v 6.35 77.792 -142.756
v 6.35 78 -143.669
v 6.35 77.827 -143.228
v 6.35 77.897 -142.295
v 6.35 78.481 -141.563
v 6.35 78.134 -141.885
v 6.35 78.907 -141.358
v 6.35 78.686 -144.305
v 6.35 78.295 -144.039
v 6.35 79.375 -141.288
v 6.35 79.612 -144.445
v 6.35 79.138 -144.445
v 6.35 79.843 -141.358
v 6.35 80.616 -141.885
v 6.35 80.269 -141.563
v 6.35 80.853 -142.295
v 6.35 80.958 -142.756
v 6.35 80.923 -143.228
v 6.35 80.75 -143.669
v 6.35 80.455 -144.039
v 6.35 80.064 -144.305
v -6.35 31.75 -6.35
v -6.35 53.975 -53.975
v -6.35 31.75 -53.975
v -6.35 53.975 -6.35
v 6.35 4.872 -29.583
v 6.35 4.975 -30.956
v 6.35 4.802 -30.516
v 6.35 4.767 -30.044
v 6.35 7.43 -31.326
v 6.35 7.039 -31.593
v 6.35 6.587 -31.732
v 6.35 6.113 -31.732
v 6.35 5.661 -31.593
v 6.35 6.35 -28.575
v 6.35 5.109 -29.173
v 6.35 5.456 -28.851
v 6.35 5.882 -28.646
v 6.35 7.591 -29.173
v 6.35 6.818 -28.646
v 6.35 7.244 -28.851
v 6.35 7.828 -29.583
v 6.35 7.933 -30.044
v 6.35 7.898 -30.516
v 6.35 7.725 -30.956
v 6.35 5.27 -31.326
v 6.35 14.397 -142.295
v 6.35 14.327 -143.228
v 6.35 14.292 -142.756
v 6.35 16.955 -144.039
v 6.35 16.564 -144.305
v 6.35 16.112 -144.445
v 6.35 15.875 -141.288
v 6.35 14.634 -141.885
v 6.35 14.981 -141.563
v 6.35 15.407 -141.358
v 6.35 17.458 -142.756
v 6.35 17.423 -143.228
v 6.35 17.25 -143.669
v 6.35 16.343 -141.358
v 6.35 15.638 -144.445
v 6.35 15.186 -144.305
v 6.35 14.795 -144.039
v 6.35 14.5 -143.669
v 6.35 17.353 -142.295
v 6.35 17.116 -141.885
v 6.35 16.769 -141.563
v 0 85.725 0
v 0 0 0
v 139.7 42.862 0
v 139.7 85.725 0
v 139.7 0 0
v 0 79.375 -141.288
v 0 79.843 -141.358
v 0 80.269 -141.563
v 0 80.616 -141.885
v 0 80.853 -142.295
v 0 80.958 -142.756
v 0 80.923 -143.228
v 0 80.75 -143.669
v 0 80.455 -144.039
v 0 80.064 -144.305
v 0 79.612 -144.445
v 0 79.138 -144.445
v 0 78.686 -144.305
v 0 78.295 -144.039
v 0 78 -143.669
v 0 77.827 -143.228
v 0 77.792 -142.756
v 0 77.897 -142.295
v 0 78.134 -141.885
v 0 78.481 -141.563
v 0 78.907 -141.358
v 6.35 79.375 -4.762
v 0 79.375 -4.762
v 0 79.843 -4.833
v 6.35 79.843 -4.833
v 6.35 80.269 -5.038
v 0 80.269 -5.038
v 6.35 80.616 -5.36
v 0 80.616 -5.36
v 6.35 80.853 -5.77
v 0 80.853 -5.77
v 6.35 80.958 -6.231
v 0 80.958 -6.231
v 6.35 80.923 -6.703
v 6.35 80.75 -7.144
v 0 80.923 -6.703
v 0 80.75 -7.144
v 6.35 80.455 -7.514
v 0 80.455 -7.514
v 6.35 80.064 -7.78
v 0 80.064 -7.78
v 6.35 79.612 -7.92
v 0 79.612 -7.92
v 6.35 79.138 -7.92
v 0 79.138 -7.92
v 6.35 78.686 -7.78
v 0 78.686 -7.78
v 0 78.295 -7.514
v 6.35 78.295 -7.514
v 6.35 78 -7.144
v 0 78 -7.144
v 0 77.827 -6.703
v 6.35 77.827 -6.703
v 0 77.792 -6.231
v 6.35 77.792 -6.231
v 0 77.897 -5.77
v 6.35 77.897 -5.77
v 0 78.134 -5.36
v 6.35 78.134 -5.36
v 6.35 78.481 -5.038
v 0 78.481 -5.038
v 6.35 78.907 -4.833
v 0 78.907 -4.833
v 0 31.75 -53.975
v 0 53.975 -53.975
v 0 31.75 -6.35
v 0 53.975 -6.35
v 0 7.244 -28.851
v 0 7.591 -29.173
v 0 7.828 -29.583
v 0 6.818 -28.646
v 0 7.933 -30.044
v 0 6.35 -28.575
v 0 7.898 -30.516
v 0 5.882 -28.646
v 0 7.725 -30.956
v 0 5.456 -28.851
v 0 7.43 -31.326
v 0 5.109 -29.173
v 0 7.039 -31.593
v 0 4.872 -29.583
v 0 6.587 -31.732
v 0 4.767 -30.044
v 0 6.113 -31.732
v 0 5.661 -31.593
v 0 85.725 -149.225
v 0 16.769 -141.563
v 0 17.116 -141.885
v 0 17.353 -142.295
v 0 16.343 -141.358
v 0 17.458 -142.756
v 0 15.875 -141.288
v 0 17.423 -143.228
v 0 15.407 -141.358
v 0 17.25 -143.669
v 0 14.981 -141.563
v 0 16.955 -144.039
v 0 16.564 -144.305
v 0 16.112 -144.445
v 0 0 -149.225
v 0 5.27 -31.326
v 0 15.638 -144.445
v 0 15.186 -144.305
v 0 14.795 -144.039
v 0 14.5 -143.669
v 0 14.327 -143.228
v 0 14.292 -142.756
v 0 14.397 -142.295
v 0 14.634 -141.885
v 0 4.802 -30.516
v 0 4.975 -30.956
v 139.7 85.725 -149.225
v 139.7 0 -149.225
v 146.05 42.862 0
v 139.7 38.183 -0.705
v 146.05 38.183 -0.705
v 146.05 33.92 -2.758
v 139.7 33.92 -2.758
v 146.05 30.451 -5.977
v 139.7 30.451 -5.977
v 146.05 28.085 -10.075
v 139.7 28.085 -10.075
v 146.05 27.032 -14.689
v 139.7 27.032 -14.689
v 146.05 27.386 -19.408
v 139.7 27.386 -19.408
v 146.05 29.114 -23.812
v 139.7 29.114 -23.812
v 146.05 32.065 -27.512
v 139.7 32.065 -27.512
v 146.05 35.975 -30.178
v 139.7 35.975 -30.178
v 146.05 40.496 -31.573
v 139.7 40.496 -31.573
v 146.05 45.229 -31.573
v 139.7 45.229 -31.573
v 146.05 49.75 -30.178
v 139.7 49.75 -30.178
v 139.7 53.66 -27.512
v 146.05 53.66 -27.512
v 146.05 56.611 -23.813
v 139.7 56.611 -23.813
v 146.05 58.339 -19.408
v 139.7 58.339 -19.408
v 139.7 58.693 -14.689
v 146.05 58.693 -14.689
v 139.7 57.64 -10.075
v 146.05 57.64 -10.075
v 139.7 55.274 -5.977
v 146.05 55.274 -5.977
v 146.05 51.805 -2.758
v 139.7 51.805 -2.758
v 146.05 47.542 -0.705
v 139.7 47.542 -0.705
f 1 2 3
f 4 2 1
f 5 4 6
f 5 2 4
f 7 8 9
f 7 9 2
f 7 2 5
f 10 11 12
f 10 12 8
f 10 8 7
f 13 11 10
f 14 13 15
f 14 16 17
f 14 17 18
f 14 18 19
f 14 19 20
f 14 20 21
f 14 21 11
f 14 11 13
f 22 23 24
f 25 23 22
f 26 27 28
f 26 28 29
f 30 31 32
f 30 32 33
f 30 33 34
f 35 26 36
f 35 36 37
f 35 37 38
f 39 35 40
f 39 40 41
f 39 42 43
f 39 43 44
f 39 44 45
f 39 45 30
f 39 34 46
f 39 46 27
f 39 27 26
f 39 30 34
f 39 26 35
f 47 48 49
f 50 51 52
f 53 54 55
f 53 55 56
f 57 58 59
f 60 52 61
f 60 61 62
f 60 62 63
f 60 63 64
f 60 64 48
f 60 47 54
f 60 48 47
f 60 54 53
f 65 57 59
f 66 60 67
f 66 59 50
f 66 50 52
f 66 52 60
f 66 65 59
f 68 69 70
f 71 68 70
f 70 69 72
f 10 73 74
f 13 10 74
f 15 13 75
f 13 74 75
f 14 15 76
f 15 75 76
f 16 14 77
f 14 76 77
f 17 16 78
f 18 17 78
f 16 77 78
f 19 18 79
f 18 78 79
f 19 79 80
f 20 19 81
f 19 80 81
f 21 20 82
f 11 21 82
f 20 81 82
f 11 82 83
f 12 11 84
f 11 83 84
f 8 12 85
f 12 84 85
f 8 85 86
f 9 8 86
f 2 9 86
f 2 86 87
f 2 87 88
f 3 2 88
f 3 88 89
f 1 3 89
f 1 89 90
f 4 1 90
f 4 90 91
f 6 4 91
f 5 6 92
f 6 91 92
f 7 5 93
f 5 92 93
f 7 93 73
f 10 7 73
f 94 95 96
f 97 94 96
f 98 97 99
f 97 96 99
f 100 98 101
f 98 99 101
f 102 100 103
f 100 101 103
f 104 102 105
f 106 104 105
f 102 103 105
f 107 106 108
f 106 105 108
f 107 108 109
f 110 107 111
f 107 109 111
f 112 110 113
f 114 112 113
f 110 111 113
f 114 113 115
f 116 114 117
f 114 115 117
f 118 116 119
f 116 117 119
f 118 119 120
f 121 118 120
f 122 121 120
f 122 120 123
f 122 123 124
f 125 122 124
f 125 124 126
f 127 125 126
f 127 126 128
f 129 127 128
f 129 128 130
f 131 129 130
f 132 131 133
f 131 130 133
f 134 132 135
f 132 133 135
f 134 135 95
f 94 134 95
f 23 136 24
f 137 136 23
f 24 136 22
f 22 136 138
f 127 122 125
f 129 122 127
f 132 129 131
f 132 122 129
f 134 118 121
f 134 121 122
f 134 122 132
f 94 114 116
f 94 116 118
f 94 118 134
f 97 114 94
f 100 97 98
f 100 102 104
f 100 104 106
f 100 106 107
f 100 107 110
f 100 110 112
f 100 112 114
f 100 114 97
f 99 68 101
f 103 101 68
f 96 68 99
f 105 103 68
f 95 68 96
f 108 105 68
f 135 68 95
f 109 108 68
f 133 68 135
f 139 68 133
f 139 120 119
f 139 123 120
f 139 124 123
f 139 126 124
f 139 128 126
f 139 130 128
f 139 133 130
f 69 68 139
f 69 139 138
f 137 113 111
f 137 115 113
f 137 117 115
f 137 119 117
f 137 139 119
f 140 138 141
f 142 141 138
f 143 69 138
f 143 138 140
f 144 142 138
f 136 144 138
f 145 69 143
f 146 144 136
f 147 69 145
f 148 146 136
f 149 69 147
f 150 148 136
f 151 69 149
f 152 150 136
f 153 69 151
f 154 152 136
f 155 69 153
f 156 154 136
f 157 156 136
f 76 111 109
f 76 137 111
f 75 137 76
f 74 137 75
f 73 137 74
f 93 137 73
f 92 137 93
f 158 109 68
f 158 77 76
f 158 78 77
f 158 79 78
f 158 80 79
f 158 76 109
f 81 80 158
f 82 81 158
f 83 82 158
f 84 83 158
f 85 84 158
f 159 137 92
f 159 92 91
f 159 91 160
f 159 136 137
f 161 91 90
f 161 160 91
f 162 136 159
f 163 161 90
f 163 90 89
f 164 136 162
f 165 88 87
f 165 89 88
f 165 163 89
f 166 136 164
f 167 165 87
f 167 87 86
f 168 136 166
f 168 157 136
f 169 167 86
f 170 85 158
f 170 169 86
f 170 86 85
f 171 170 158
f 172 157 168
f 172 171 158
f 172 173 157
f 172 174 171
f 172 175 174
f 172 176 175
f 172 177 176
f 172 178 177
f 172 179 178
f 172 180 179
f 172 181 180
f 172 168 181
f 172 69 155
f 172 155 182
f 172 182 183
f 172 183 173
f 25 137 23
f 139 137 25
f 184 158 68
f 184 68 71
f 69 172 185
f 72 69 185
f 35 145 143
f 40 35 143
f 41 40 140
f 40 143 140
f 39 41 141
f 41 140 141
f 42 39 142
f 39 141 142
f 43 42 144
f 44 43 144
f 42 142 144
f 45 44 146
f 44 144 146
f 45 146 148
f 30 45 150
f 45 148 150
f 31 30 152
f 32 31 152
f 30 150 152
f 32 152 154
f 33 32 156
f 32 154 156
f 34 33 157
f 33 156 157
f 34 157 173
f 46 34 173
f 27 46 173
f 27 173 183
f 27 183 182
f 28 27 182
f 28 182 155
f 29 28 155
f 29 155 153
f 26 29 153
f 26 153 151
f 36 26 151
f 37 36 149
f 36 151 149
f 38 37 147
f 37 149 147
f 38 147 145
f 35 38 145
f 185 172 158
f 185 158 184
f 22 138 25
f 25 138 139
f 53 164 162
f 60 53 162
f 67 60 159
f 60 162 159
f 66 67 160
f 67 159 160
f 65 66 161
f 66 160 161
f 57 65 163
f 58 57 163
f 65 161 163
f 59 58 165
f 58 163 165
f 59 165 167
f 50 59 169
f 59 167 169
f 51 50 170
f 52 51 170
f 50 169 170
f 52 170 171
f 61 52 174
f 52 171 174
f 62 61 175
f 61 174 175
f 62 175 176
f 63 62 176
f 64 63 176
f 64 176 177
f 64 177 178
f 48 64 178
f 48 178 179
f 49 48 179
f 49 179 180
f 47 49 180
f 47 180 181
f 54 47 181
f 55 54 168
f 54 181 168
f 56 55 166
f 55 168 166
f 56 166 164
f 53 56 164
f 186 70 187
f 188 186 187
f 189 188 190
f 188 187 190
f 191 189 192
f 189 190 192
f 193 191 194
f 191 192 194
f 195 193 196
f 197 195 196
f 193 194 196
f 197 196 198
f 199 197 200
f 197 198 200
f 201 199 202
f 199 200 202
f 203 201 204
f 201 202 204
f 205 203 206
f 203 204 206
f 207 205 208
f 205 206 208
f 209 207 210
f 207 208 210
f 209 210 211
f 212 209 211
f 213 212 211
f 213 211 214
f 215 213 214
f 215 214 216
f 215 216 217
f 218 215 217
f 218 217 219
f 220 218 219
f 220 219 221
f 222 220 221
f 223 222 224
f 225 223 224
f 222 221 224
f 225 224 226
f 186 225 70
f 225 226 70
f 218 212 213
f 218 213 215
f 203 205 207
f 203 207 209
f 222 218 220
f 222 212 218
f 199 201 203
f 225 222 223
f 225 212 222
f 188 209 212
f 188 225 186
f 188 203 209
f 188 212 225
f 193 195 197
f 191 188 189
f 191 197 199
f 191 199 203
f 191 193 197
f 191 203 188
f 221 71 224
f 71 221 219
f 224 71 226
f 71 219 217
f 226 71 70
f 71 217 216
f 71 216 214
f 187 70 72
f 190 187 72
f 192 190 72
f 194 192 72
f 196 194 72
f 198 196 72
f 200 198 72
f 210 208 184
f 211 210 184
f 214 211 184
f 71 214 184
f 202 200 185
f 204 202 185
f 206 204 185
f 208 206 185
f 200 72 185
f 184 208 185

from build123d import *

# Parameters (mm, degrees)
SKETCH1_W           = 139.7
SKETCH1_H           = 149.225
BOSS_EXTRUDE1_DEPTH = 85.725
SKETCH2_W           = 47.625
SKETCH2_H           = 22.225
BOSS_EXTRUDE2_DEPTH = 6.35
SKETCH3_R           = 15.875
BOSS_EXTRUDE3_DEPTH = 6.35
SKETCH4_R           = 1.5875
CUT_EXTRUDE1_DEPTH  = 6.35


with BuildPart() as part:
    # Sketch1 → Boss-Extrude1 (new body)
    with BuildSketch(Plane(origin=(0, 0, 0), x_dir=(1, 0, 0), z_dir=(0, 1, 0))):
        with Locations((69.85, 74.6125)):
            Rectangle(SKETCH1_W, SKETCH1_H)
    extrude(amount=BOSS_EXTRUDE1_DEPTH)

    # Sketch2 → Boss-Extrude2 (add)
    with BuildSketch(Plane.ZY):
        with Locations((-30.1625, 42.8625)):
            Rectangle(SKETCH2_W, SKETCH2_H)
    extrude(amount=BOSS_EXTRUDE2_DEPTH)

    # Sketch3 → Boss-Extrude3 (add)
    with BuildSketch(Plane(origin=(139.7, 0, 0), x_dir=(0, 0, -1), z_dir=(1, 0, 0))):
        with Locations(Location((15.875, 42.8625, 0), (0, 0, 180))):
            Circle(SKETCH3_R)
    extrude(amount=BOSS_EXTRUDE3_DEPTH)

    # Sketch4 → Cut-Extrude1 (cut)
    with BuildSketch(Plane.ZY):
        with Locations((-6.35, 79.375)):
            Circle(SKETCH4_R)
        with Locations((-142.875, 79.375)):
            Circle(SKETCH4_R)
        with Locations((-142.875, 15.875)):
            Circle(SKETCH4_R)
        with Locations((-30.1625, 6.35)):
            Circle(SKETCH4_R)
    extrude(amount=-CUT_EXTRUDE1_DEPTH, mode=Mode.SUBTRACT)


solid = part.part
